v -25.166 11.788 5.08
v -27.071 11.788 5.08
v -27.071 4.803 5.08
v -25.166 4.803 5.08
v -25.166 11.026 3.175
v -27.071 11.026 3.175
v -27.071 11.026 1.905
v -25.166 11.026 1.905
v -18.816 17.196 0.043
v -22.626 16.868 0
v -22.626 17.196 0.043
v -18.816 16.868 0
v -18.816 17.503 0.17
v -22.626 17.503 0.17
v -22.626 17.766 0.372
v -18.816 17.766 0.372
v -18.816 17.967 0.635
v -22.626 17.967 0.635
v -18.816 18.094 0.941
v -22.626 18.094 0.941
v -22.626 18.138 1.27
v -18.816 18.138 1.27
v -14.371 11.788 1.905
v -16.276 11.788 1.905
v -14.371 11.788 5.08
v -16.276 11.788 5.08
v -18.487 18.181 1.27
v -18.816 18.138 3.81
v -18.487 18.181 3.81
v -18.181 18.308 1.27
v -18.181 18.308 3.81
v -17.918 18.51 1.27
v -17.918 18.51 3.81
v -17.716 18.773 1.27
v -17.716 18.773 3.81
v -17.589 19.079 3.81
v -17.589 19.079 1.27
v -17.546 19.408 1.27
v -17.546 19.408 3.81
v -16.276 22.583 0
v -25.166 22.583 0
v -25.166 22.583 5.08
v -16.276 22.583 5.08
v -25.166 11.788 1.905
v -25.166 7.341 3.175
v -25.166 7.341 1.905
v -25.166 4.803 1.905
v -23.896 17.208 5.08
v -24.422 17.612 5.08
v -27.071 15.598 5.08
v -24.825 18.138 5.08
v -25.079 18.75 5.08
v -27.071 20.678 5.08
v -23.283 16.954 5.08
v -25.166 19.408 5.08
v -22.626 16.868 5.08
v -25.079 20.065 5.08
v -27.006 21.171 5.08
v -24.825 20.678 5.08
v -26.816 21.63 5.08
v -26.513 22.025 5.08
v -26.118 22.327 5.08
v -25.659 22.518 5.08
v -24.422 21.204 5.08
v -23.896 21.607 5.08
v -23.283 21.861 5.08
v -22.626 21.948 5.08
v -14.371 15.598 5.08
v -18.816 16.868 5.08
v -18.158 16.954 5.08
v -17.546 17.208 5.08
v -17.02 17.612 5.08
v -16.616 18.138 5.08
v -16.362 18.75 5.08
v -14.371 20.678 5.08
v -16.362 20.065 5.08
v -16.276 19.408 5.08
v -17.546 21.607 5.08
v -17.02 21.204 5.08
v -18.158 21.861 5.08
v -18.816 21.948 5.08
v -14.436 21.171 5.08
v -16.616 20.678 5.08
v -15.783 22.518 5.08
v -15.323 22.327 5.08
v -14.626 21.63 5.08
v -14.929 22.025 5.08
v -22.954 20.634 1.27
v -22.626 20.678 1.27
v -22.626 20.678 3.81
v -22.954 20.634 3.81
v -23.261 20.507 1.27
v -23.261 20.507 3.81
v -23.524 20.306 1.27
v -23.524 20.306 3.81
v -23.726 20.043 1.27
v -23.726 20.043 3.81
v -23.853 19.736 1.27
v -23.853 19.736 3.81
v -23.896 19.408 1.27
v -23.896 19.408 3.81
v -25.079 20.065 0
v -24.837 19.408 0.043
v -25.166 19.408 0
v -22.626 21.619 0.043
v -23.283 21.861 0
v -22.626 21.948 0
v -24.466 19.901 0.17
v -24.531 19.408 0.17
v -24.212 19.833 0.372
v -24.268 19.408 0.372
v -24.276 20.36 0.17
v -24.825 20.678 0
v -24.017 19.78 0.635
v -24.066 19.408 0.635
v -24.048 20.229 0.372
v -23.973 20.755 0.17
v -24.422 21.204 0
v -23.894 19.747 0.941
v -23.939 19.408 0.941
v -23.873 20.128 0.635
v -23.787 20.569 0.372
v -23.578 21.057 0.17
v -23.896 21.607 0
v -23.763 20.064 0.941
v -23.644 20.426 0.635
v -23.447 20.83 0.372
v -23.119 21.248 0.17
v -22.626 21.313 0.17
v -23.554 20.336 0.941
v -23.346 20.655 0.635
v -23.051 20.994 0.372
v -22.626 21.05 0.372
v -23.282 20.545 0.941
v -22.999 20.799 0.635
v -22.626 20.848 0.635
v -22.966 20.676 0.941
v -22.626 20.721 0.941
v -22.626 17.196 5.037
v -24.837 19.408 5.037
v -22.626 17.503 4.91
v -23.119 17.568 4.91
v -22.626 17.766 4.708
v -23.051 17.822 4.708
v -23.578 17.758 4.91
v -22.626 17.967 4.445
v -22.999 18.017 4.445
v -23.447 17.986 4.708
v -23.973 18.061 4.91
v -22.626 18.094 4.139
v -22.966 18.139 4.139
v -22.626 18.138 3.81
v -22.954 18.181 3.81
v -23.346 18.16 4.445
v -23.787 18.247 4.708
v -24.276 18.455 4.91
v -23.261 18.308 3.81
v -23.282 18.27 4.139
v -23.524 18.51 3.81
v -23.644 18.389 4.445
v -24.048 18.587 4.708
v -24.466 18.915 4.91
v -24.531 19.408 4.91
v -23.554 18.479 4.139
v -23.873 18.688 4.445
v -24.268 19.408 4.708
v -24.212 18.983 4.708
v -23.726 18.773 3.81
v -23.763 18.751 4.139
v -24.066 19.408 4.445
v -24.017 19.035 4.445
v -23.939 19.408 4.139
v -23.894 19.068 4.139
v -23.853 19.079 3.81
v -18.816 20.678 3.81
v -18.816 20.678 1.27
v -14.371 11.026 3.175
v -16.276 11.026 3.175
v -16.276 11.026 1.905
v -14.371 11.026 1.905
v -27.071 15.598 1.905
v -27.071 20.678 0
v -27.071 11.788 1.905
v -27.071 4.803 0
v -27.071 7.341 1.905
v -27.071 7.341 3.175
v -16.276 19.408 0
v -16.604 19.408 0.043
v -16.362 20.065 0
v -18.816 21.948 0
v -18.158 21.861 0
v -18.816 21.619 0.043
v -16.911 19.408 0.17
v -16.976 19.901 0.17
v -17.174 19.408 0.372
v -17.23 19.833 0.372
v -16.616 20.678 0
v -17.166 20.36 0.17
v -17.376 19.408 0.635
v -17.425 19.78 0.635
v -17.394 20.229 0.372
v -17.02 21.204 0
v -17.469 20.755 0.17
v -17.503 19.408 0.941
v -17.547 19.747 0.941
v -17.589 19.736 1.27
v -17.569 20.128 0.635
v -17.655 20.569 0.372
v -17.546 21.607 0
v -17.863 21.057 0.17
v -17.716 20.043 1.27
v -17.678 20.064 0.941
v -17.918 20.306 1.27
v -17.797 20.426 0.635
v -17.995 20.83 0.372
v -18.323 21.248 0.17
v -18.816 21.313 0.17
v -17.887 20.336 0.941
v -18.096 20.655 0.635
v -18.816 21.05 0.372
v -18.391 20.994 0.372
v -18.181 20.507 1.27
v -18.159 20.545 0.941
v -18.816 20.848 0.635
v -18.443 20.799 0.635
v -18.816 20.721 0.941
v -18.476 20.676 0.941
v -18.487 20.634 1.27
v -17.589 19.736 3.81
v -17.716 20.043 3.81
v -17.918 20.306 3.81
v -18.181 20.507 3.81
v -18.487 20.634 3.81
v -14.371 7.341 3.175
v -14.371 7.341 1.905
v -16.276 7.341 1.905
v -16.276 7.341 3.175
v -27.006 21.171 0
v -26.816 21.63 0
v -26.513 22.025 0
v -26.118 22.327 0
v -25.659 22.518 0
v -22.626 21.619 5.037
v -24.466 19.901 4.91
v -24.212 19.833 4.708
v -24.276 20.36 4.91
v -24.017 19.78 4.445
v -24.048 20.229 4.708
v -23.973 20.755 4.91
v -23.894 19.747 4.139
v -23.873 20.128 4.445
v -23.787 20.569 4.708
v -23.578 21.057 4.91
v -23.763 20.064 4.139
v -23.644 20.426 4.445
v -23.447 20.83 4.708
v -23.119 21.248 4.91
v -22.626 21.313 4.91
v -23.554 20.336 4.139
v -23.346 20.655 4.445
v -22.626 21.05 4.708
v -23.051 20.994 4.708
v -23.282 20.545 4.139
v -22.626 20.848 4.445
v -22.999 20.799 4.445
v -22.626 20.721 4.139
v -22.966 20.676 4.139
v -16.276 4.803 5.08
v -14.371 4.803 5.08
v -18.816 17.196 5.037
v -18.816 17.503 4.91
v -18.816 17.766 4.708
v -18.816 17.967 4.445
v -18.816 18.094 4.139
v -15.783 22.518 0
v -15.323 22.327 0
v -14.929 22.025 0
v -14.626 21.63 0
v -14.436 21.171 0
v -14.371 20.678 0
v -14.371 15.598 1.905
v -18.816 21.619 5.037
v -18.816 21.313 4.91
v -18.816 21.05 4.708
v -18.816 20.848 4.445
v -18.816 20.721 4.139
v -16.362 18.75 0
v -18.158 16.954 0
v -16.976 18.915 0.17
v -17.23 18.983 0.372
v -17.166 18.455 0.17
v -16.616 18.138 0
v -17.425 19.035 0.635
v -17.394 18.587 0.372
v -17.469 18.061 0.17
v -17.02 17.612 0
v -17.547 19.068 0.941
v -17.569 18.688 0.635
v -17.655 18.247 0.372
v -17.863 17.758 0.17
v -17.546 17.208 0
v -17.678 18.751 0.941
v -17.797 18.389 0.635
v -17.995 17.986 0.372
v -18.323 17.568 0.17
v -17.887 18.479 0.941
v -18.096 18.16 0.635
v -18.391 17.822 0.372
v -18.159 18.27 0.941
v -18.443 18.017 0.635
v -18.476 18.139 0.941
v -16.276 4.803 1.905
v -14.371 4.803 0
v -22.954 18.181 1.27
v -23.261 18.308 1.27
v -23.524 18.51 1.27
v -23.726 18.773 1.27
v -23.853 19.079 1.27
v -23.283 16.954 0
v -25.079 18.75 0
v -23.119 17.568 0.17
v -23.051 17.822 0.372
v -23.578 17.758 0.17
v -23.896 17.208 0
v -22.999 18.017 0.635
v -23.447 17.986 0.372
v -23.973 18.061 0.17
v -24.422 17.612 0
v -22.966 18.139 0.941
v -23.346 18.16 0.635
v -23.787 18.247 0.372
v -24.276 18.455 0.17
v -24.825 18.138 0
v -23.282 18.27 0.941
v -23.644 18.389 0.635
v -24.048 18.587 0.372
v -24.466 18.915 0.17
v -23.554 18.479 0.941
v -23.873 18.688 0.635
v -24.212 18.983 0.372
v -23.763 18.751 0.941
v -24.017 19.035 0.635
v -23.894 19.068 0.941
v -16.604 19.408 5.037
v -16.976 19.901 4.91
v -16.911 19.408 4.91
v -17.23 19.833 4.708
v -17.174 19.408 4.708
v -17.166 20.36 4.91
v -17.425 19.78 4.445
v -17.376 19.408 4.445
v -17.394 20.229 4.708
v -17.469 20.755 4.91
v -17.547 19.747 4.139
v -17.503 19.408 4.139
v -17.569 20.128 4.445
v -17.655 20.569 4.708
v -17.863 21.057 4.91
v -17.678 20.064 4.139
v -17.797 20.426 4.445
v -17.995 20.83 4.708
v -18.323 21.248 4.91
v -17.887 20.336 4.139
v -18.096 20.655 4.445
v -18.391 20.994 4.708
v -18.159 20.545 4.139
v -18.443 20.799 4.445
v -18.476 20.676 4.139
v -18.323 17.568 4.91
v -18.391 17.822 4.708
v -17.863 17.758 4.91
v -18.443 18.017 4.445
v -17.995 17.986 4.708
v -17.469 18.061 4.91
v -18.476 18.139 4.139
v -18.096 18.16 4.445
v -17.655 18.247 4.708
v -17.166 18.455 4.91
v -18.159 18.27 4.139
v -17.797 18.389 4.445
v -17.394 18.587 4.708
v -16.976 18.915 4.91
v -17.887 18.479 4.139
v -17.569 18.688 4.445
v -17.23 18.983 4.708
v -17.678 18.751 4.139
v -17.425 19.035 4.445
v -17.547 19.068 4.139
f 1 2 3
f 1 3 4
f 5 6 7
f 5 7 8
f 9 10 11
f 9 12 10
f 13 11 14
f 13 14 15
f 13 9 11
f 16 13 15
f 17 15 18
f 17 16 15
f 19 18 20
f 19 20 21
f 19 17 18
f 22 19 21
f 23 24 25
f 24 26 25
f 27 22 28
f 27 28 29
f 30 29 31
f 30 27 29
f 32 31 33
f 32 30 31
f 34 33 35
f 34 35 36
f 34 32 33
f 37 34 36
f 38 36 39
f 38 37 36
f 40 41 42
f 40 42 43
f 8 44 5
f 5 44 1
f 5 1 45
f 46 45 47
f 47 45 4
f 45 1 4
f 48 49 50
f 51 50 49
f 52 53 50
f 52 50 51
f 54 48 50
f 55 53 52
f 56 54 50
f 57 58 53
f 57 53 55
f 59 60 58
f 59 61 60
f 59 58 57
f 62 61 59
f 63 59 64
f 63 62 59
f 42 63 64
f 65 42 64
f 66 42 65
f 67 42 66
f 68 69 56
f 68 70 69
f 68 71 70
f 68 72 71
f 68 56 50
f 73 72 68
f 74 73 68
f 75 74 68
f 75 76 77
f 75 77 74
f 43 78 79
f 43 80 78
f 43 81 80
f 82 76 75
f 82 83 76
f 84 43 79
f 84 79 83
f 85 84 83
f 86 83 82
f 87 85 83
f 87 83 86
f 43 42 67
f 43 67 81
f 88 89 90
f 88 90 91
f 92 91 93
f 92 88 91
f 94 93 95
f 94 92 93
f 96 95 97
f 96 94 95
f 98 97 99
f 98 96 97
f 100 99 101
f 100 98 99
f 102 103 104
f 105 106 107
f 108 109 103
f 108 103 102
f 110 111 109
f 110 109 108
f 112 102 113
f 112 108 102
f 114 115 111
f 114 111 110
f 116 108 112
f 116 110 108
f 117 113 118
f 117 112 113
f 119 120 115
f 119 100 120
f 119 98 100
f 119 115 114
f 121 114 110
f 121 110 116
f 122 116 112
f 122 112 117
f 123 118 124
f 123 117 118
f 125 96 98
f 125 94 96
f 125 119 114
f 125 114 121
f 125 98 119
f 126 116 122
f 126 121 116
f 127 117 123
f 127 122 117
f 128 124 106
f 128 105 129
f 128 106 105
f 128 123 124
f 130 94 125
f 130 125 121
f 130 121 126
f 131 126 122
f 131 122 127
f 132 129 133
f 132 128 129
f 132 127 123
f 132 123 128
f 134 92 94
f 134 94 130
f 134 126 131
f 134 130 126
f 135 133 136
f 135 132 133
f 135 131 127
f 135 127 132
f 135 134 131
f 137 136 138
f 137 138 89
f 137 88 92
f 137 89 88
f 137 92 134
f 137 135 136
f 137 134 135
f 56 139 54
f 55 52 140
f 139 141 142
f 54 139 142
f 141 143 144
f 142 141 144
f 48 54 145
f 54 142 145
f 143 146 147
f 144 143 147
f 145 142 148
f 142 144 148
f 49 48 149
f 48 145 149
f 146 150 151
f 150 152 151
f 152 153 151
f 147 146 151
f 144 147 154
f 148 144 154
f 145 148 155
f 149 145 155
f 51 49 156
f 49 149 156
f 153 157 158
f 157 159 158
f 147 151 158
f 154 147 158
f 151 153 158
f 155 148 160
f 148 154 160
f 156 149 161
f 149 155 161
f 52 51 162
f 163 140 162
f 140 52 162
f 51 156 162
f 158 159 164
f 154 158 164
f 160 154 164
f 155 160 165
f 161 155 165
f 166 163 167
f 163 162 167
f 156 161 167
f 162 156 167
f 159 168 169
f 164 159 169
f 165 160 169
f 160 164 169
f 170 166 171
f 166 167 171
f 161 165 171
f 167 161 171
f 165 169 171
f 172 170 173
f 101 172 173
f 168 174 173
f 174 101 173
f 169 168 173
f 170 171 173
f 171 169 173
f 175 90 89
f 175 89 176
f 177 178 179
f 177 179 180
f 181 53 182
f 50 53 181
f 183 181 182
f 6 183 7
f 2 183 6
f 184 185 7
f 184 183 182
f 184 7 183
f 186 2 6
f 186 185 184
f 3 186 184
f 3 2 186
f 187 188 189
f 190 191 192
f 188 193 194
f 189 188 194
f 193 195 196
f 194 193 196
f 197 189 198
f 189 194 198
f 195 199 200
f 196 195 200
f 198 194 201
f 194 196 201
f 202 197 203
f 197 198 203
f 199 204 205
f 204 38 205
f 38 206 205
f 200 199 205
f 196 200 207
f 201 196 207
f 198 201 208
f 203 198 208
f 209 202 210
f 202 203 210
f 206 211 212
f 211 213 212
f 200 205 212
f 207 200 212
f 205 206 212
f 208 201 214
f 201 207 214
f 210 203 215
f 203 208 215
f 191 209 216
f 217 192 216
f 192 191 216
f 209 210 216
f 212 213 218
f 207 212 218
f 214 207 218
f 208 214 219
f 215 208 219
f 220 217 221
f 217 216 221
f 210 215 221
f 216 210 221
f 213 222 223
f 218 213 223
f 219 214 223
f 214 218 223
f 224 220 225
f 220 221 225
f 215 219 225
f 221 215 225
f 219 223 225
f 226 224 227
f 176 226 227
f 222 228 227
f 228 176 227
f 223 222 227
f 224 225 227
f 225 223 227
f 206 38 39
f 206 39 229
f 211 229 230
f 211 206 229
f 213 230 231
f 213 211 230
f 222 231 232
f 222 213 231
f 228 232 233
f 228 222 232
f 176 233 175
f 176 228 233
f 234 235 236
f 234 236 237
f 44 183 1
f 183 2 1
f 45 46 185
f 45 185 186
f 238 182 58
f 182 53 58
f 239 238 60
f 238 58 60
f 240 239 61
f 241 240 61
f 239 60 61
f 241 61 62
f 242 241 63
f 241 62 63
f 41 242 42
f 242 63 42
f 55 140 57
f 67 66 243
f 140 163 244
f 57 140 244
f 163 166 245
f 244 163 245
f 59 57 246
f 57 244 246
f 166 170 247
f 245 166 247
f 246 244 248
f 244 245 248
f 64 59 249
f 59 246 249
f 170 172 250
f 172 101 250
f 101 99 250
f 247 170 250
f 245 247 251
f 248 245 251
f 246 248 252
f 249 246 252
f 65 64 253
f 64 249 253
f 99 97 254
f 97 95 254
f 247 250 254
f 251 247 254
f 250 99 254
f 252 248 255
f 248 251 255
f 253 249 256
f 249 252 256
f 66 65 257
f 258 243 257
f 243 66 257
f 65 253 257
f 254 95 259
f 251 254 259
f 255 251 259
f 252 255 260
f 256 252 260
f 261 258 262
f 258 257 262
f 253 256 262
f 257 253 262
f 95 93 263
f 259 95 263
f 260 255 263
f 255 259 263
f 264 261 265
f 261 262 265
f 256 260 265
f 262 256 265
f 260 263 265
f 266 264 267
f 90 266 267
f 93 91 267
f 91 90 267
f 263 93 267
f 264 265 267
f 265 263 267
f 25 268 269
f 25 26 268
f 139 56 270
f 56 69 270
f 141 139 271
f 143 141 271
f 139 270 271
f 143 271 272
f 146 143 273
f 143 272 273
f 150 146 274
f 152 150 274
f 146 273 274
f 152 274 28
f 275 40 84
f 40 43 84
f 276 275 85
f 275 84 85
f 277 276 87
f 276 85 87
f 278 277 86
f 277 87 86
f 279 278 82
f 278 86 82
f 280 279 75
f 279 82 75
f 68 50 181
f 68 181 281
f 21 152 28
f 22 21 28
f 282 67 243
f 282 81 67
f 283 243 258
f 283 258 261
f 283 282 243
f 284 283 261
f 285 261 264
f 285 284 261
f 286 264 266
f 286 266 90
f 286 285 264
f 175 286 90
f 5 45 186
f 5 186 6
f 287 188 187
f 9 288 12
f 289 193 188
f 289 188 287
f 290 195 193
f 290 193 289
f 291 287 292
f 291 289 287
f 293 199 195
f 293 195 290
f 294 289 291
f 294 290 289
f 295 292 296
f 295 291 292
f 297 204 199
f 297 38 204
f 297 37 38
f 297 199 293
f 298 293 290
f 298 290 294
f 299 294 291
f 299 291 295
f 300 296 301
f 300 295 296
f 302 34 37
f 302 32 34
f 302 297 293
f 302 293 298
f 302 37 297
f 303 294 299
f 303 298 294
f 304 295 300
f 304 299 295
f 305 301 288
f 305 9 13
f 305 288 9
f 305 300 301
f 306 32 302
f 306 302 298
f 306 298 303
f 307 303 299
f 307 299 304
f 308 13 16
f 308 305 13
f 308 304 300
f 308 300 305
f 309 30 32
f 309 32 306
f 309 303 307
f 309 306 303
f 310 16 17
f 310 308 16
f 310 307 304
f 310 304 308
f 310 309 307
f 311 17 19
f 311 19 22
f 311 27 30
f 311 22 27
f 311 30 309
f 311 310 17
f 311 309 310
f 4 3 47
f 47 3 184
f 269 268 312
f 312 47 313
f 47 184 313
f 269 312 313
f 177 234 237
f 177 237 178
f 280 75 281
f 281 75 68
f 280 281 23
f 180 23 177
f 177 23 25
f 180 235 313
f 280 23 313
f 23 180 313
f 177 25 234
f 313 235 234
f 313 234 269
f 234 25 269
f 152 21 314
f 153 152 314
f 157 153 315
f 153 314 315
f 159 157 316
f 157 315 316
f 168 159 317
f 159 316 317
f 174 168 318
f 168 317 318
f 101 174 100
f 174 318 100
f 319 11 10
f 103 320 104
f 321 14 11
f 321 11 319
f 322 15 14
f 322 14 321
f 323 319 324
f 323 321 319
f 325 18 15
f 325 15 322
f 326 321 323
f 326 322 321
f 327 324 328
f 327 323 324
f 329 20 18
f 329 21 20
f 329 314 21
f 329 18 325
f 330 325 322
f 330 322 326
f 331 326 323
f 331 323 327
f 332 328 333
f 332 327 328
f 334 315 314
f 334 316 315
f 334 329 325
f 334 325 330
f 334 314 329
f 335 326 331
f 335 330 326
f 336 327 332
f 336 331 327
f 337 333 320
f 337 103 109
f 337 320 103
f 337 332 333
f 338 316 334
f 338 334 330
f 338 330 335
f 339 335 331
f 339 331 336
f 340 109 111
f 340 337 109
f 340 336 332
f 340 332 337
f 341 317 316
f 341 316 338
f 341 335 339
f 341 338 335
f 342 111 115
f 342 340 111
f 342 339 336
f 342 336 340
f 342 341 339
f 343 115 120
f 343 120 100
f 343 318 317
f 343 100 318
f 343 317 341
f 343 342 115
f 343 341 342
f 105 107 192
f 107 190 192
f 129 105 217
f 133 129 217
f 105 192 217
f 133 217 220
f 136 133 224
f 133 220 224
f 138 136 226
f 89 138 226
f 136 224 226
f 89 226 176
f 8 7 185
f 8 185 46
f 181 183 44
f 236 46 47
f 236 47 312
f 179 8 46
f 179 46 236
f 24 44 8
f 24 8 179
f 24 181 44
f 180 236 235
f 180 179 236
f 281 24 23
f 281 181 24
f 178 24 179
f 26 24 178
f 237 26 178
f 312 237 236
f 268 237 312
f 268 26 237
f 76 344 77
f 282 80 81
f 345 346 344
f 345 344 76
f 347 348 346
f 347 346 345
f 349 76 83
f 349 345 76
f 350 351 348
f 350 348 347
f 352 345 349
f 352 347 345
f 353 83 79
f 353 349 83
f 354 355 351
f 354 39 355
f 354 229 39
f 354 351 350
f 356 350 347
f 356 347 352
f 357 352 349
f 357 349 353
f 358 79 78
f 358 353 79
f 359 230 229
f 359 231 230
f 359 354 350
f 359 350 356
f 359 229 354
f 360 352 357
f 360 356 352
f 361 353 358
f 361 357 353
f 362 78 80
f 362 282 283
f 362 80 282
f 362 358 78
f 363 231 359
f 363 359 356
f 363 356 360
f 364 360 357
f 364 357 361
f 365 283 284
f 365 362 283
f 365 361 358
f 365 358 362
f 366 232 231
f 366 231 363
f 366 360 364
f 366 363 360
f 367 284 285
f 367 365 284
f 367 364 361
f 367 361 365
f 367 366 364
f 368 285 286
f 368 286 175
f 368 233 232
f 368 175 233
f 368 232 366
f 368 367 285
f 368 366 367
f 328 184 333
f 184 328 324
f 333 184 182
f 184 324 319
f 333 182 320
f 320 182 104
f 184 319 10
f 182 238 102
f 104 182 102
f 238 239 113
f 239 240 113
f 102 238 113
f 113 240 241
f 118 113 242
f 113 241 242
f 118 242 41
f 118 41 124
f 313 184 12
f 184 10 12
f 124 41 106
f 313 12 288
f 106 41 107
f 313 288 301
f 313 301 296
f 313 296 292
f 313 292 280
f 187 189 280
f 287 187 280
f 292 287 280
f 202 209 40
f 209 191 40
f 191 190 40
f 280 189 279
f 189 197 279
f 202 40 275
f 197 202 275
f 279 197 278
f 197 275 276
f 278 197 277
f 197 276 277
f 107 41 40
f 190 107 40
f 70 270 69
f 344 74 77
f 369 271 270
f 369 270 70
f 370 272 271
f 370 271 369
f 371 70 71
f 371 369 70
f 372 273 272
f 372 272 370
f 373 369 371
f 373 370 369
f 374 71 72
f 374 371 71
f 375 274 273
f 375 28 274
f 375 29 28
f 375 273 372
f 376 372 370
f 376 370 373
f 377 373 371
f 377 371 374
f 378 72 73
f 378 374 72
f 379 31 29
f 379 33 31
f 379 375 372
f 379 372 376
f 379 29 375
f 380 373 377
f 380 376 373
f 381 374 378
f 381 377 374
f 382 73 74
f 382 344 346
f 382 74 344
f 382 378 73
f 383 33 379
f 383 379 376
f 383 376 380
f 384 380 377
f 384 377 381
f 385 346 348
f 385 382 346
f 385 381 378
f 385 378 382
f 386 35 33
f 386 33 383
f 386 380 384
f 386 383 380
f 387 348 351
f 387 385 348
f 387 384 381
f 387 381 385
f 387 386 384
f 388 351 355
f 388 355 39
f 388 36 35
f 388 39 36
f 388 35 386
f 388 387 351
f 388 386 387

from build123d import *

# Parameters (mm, degrees)
F0_W      = 12.7
F0_H      = 15.24
F1_DEPTH  = 5.08
F2_W      = 6.35
F2_H      = 2.54
F3_DEPTH  = 25.4
F4_R      = 1.26999
F5_R      = 1.905
F6_W      = 5.715
F6_H      = 1.27
F7_DEPTH  = 25.4
F8_W      = 8.89
F8_H      = 8.255
F9_DEPTH  = 3.175
F10_W     = 1.905
F10_H     = 3.81
F11_DEPTH = 1.905
F12_DEPTH = 2.54
F13_W     = 2.5417556653
F13_H     = 1.27
F14_DEPTH = 25.4
F15_W     = 1.905
F15_H     = 0.762
F16_DEPTH = 1.27
F17_W     = 1.905
F17_H     = 0.762
F18_DEPTH = 1.27


# Not quite as in the source:
# - a fillet or chamfer is up to 0.001 mm smaller than in the source, because OpenCascade refuses the exact size


with BuildPart() as f1:
    # F0 (on Top) → F1 (new body)
    with BuildSketch(Plane.XY):
        with Locations((-20.7207803614, 14.9625845535)):
            Rectangle(F0_W, F0_H)
    extrude(amount=F1_DEPTH)

    # F2 (on face) → F3 (cut)
    with BuildSketch(Plane.XY.offset(5.08)):
        with Locations((-20.7207803614, 19.4075845535)):
            Rectangle(F2_W, F2_H)
    extrude(amount=-F3_DEPTH, mode=Mode.SUBTRACT)

    # F4 (radius 1.27 in the source; OpenCascade refuses exactly that, so slightly less here)
    f4_edges = [f1.edges().sort_by_distance(p)[0] for p in [
        (-20.72078, 18.137585, 5.08),
        (-17.54578, 19.407585, 5.08),
        (-23.89578, 19.407585, 5.08),
        (-20.72078, 20.677585, 5.08),
        (-17.54578, 19.407585, 0),
        (-20.72078, 18.137585, 0),
        (-23.89578, 19.407585, 0),
        (-20.72078, 20.677585, 0),
        (-17.54578, 18.137585, 2.54),
        (-23.89578, 18.137585, 2.54),
        (-23.89578, 20.677585, 2.54),
        (-17.54578, 20.677585, 2.54),
    ]]
    fillet(f4_edges, radius=F4_R)

    # F5
    f5_edges = [f1.edges().sort_by_distance(p)[0] for p in [
        (-27.07078, 22.582585, 2.54),
        (-14.37078, 22.582585, 2.54),
    ]]
    fillet(f5_edges, radius=F5_R)

    # F6 (on face) → F7 (cut)
    with BuildSketch(Plane.YZ.offset(-14.3707803614)):
        with Locations((12.7400845535, 2.54)):
            Rectangle(F6_W, F6_H)
    extrude(amount=-F7_DEPTH, mode=Mode.SUBTRACT)

    # F8 (on face) → F9 (cut, through all)
    with BuildSketch(Plane.XY.offset(5.08)):
        with Locations((-20.7207803614, 11.4700845535)):
            Rectangle(F8_W, F8_H)
    extrude(amount=-F9_DEPTH, mode=Mode.SUBTRACT)

    # F10 (on face) → F11 (cut, through all)
    with BuildSketch(Plane.XY.offset(5.08)):
        with Locations((-26.1182803614, 13.6925845535)):
            Rectangle(F10_W, F10_H)
        with Locations((-15.3232803614, 13.6925845535)):
            Rectangle(F10_W, F10_H)
    extrude(amount=-F11_DEPTH, mode=Mode.SUBTRACT)

    # F12 (add): a face of the model
    f12_faces = [f1.faces().sort_by_distance(p)[0] for p in [
        (-20.7207803614, 7.3425845535, 1.7991666667),
    ]]
    extrude(f12_faces, amount=F12_DEPTH)

    # F13 (on face) → F14 (cut)
    with BuildSketch(Plane.YZ.offset(-14.3707803614)):
        with Locations((8.6117067208, 2.54)):
            Rectangle(F13_W, F13_H)
    extrude(amount=-F14_DEPTH, mode=Mode.SUBTRACT)

    # F15 (on face) → F16 (join, through all)
    with BuildSketch(Plane(origin=(0, 0, 3.175), x_dir=(1, 0, 0), z_dir=(0, 0, -1))):
        with Locations((-15.3232803614, -11.4065845535)):
            Rectangle(F15_W, F15_H)
    extrude(amount=F16_DEPTH)

    # F17 (on face) → F18 (join, through all)
    with BuildSketch(Plane(origin=(0, 0, 3.175), x_dir=(1, 0, 0), z_dir=(0, 0, -1))):
        with Locations((-26.1182803614, -11.4065845535)):
            Rectangle(F17_W, F17_H)
    extrude(amount=F18_DEPTH)


solid = f1.part
